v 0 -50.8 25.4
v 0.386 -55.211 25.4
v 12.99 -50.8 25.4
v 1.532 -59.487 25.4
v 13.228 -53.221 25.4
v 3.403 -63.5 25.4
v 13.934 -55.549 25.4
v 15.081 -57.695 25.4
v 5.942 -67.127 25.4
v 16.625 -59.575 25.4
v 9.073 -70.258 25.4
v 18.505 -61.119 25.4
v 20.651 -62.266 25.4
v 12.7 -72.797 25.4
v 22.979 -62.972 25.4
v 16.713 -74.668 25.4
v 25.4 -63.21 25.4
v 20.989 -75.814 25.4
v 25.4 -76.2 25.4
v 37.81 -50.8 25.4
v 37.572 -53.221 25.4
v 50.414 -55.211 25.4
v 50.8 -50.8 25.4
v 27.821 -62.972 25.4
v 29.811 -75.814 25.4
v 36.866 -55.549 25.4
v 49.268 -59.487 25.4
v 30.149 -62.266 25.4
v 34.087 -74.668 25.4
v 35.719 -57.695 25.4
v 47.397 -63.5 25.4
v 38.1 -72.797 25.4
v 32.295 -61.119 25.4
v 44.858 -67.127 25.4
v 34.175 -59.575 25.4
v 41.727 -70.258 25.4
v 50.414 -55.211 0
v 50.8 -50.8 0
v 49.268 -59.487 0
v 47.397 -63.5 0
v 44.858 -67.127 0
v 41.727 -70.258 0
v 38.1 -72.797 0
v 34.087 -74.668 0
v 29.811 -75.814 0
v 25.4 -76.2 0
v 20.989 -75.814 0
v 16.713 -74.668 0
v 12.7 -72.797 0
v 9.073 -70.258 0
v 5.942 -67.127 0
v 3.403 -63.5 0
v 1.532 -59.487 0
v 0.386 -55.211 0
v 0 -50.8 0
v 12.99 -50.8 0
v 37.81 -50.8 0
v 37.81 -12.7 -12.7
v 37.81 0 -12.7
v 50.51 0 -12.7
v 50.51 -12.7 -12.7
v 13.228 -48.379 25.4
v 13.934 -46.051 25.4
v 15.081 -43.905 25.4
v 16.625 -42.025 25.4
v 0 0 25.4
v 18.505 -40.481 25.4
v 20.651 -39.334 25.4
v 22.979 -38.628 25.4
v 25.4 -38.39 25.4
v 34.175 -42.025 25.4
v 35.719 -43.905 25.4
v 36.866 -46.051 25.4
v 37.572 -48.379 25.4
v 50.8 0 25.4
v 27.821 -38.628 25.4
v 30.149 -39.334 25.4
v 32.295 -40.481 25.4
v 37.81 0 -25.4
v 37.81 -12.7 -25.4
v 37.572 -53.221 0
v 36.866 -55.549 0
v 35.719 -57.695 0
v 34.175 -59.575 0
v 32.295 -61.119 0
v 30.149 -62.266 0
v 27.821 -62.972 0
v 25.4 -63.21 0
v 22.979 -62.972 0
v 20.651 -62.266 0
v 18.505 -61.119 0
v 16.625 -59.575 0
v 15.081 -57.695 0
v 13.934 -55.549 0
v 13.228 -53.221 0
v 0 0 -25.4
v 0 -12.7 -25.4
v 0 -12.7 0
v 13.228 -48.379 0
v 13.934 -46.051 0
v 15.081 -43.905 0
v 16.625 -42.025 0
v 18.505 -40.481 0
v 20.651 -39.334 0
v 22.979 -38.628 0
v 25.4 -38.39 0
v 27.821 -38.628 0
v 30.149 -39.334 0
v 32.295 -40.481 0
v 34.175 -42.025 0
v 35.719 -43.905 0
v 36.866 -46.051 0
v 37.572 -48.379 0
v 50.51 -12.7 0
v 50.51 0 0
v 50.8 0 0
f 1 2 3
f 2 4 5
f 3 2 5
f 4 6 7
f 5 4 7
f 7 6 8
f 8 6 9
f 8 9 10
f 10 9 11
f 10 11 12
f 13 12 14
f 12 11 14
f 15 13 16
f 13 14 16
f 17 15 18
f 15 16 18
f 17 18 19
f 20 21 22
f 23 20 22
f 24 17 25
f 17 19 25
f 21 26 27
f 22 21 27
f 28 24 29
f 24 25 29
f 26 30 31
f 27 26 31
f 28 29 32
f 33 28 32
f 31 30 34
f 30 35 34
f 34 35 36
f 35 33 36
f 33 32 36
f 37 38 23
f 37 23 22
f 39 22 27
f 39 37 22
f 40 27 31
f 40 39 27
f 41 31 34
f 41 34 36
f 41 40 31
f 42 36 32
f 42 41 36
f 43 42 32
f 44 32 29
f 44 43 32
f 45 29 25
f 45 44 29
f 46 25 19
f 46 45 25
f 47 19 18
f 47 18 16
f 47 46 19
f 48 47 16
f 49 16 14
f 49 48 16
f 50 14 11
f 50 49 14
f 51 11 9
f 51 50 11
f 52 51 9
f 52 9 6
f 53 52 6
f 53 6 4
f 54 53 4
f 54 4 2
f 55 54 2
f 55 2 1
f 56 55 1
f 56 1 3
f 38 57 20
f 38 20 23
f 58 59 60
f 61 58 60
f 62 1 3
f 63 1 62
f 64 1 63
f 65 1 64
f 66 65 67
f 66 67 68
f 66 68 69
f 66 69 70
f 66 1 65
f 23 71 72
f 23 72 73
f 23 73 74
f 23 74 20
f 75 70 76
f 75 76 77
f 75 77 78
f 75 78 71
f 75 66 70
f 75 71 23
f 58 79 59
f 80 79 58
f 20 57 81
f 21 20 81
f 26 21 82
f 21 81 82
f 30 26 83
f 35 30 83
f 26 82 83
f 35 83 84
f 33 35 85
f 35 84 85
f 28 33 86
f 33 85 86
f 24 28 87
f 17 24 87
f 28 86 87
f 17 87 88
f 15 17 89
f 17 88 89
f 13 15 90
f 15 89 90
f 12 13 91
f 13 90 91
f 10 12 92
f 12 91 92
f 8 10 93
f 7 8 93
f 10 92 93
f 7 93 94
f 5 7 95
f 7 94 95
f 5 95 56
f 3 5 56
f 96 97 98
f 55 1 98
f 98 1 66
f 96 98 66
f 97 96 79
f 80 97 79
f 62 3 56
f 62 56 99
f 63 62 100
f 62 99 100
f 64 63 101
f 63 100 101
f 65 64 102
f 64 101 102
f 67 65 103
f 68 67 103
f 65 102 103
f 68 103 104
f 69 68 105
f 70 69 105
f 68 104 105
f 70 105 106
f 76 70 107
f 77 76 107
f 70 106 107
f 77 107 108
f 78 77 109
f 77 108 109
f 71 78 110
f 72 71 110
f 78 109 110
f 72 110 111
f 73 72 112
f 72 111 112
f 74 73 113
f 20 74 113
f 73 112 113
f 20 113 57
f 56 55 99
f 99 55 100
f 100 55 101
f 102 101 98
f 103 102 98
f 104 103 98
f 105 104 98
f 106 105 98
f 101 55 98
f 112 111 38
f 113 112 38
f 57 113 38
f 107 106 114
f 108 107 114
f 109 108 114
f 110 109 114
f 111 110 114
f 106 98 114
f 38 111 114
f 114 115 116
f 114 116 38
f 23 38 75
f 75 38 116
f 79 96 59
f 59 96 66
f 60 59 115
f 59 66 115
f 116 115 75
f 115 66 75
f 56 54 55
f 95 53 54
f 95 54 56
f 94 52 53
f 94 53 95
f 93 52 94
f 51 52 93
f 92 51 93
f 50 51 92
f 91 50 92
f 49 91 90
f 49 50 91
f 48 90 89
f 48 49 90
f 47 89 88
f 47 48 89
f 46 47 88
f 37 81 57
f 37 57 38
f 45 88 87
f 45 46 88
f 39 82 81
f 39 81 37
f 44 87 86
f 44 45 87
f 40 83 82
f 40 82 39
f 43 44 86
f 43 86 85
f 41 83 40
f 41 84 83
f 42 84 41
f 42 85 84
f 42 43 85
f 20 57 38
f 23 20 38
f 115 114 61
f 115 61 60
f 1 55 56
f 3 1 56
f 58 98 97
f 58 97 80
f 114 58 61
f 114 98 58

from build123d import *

# Parameters (mm, degrees)
F0_W      = 50.8
F0_H      = 50.8
F1_DEPTH  = 25.4
F2_W      = 50.5102332488
F2_H      = 12.7
F3_DEPTH  = 25.4
F4_W      = 12.7
F4_H      = 12.7
F5_DEPTH  = 12.7
F7_DEPTH  = 25.4
F9_DEPTH  = 25.4
F8_R      = 12.4102332488
F10_DEPTH = 25.4
F11_DEPTH = 25.4


with BuildPart() as f1:
    # F0 (on Top) → F1 (new body)
    with BuildSketch(Plane.XY):
        with Locations((25.4, -25.4)):
            Rectangle(F0_W, F0_H)
    extrude(amount=F1_DEPTH)

    # F2 (on Top) → F3 (join)
    with BuildSketch(Plane.XY):
        with Locations((25.2551166244, -6.35)):
            Rectangle(F2_W, F2_H)
    extrude(amount=-F3_DEPTH)

    # F4 (on face) → F5 (cut)
    with BuildSketch(Plane(origin=(0, 0, -25.4), x_dir=(1, 0, 0), z_dir=(0, 0, -1))):
        with Locations((44.1602332488, 6.35)):
            Rectangle(F4_W, F4_H)
    extrude(amount=-F5_DEPTH, mode=Mode.SUBTRACT)


with BuildPart() as f7:
    # F6 (on face) → F7 (new body)
    with BuildSketch(Plane(origin=(0, 0, 0), x_dir=(1, 0, 0), z_dir=(0, 0, -1))):
        with BuildLine():
            Line((0, 50.8), (50.8, 50.8))
            ThreePointArc((50.8, 50.8), (25.4, 76.2), (0, 50.8))
        make_face()
    extrude(amount=-F7_DEPTH)


with BuildPart() as f9_tool:
    # F8 (on face) → F9 (new body)
    with BuildSketch(Plane(origin=(0, 0, 0), x_dir=(1, 0, 0), z_dir=(0, 0, -1))):
        with BuildLine():
            ThreePointArc((12.9897667512, 50.8), (25.4, 38.3897667512), (37.8102332488, 50.8))
            Line((37.8102332488, 50.8), (12.9897667512, 50.8))
        make_face()
        with BuildLine():
            Line((12.9897667512, 50.8), (37.8102332488, 50.8))
            ThreePointArc((37.8102332488, 50.8), (25.4, 63.2102332488), (12.9897667512, 50.8))
        make_face()
    extrude(amount=-F9_DEPTH)


with BuildPart() as f1_1:
    add(f1.part)

    # F9: cut by f9_tool
    add(f9_tool.part, mode=Mode.SUBTRACT)

    # F8 (on face) → F10 (cut)
    with BuildSketch(Plane(origin=(0, 0, 0), x_dir=(1, 0, 0), z_dir=(0, 0, -1))):
        with Locations((25.4, 50.8)):
            Circle(F8_R)
    extrude(amount=-F10_DEPTH, mode=Mode.SUBTRACT)

    # F8 (on face) → F11 (cut)
    with BuildSketch(Plane(origin=(0, 0, 0), x_dir=(1, 0, 0), z_dir=(0, 0, -1))):
        with Locations((25.4, 50.8)):
            Circle(F8_R)
    extrude(amount=-F11_DEPTH, mode=Mode.SUBTRACT)


with BuildPart() as f7_1:
    add(f7.part)

    # F9: cut by f9_tool
    add(f9_tool.part, mode=Mode.SUBTRACT)


solid = Compound([f1_1.part, f7_1.part])
